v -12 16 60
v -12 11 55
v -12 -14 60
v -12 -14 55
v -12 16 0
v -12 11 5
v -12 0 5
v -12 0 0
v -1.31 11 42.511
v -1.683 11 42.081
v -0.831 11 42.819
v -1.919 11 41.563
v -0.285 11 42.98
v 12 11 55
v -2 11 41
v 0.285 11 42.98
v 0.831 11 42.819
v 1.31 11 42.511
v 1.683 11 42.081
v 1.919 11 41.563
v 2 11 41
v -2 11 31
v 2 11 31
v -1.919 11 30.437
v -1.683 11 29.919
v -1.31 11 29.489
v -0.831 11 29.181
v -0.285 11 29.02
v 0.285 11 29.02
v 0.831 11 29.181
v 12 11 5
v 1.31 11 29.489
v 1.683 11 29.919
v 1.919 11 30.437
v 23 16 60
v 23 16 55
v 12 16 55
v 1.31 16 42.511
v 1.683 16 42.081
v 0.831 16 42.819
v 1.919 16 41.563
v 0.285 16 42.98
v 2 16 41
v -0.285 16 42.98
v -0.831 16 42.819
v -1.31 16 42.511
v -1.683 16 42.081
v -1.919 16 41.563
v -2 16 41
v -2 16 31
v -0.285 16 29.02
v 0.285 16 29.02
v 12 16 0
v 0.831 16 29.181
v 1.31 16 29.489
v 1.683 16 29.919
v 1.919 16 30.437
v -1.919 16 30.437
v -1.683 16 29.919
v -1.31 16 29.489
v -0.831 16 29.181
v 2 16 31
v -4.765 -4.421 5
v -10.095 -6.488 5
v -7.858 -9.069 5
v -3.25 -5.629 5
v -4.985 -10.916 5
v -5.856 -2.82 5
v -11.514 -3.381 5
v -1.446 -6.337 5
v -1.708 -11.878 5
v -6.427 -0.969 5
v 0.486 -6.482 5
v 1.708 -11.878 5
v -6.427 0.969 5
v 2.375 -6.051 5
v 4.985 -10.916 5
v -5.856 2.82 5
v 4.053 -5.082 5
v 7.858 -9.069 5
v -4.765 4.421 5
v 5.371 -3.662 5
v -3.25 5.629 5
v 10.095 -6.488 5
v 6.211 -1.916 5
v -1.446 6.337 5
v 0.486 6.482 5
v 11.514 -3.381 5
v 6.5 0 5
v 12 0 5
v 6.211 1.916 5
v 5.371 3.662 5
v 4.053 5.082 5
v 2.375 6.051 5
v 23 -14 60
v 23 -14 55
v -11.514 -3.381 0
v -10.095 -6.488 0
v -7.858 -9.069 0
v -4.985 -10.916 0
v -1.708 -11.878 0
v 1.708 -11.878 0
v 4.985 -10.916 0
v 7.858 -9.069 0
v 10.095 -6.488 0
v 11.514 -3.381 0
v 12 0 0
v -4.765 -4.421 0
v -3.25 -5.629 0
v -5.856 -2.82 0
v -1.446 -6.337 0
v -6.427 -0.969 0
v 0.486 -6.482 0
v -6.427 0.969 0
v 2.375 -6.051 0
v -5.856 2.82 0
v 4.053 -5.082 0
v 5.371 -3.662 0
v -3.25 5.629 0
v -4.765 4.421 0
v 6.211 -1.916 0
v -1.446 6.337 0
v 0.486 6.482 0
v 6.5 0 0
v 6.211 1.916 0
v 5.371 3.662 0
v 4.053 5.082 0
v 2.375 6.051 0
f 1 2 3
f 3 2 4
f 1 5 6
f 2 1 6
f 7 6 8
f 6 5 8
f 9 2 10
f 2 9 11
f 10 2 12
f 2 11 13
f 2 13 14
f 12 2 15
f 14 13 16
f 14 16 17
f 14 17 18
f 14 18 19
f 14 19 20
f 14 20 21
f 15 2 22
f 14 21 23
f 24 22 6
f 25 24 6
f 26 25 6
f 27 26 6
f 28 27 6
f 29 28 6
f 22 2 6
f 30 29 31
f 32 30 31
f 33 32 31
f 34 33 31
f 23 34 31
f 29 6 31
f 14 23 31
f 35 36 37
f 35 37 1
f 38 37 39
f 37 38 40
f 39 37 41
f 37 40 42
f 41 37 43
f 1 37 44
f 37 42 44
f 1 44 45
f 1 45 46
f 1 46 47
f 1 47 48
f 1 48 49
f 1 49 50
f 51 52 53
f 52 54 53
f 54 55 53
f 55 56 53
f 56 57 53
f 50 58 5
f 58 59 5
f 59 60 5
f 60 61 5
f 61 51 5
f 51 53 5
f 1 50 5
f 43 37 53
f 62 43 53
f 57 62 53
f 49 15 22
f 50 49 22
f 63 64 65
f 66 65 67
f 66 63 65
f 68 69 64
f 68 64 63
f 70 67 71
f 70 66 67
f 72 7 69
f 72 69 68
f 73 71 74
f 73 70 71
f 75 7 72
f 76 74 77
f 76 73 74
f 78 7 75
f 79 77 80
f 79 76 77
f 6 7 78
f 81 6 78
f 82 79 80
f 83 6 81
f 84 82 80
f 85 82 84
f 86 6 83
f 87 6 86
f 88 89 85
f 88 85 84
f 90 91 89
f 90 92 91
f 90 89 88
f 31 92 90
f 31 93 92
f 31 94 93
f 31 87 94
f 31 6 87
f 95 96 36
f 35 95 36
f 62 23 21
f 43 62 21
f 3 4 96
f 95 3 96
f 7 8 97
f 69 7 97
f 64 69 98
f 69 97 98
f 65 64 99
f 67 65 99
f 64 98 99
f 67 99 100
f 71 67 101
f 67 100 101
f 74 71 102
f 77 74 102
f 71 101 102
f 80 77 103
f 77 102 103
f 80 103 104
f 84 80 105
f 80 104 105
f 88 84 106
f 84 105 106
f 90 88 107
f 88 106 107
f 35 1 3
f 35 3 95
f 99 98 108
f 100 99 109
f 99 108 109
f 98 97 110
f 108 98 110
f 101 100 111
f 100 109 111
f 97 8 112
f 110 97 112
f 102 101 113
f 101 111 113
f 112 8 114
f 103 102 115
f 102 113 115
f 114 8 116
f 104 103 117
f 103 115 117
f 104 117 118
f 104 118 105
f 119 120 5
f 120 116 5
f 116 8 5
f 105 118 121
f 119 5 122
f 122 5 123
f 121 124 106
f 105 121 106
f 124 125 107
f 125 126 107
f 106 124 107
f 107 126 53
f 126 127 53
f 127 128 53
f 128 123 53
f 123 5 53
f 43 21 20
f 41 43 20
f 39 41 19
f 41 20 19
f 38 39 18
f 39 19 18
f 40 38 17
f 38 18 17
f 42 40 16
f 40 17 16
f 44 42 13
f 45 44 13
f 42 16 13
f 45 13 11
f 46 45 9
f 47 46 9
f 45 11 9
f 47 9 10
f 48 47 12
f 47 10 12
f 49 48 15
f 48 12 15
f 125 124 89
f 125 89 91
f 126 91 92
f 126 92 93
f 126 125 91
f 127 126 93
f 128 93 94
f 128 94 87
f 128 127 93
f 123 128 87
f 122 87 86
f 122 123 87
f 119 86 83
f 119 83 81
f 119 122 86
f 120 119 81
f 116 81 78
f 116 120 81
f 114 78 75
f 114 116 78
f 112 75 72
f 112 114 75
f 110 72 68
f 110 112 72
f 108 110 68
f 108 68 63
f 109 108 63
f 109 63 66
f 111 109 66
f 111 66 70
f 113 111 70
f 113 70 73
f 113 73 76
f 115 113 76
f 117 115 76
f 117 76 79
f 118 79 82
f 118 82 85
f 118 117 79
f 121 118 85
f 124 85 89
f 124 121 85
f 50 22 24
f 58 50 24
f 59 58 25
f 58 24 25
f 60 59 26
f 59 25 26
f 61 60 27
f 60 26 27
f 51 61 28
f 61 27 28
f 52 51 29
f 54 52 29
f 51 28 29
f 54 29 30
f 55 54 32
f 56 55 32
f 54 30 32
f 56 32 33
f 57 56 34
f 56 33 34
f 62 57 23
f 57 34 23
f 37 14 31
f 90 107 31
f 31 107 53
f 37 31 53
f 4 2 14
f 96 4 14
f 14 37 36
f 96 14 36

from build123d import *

# Parameters (mm, degrees)
F0_R     = 6.5
F1_DEPTH = 5
F2_W     = 24
F2_H     = 5
F3_DEPTH = 50
F5_DEPTH = 5.001
F6_W     = 24
F6_H     = 5
F7_DEPTH = 5


with BuildPart() as f1:
    # F0 (on Top) → F1 (new body)
    with BuildSketch(Plane.XY):
        with BuildLine():
            Line((-12, 16), (-12, 0))
            ThreePointArc((-12, 0), (0, -12), (12, 0))
            Line((12, 0), (12, 16))
            Line((12, 16), (-12, 16))
        make_face()
        Circle(F0_R, mode=Mode.SUBTRACT)
    extrude(amount=F1_DEPTH)

    # F2 (on face) → F3 (join)
    with BuildSketch(Plane.XY.offset(5)):
        with Locations((0, 13.5)):
            Rectangle(F2_W, F2_H)
    extrude(amount=F3_DEPTH)

    # F4 (on face) → F5 (cut, through all)
    with BuildSketch(Plane.XZ.offset(-11)):
        with BuildLine():
            ThreePointArc((2, 41), (0, 43), (-2, 41))
            Line((-2, 41), (-2, 31))
            ThreePointArc((-2, 31), (0, 29), (2, 31))
            Line((2, 31), (2, 41))
        make_face()
    extrude(amount=-F5_DEPTH, mode=Mode.SUBTRACT)

    # F6 (on face) → F7 (join)
    with BuildSketch(Plane.XY.offset(55)):
        Polygon((23, 16), (12, 16), (12, 11), (-12, 11), (-12, -14), (23, -14), align=None)
        with Locations((0, 13.5)):
            Rectangle(F6_W, F6_H)
    extrude(amount=F7_DEPTH)


solid = f1.part
